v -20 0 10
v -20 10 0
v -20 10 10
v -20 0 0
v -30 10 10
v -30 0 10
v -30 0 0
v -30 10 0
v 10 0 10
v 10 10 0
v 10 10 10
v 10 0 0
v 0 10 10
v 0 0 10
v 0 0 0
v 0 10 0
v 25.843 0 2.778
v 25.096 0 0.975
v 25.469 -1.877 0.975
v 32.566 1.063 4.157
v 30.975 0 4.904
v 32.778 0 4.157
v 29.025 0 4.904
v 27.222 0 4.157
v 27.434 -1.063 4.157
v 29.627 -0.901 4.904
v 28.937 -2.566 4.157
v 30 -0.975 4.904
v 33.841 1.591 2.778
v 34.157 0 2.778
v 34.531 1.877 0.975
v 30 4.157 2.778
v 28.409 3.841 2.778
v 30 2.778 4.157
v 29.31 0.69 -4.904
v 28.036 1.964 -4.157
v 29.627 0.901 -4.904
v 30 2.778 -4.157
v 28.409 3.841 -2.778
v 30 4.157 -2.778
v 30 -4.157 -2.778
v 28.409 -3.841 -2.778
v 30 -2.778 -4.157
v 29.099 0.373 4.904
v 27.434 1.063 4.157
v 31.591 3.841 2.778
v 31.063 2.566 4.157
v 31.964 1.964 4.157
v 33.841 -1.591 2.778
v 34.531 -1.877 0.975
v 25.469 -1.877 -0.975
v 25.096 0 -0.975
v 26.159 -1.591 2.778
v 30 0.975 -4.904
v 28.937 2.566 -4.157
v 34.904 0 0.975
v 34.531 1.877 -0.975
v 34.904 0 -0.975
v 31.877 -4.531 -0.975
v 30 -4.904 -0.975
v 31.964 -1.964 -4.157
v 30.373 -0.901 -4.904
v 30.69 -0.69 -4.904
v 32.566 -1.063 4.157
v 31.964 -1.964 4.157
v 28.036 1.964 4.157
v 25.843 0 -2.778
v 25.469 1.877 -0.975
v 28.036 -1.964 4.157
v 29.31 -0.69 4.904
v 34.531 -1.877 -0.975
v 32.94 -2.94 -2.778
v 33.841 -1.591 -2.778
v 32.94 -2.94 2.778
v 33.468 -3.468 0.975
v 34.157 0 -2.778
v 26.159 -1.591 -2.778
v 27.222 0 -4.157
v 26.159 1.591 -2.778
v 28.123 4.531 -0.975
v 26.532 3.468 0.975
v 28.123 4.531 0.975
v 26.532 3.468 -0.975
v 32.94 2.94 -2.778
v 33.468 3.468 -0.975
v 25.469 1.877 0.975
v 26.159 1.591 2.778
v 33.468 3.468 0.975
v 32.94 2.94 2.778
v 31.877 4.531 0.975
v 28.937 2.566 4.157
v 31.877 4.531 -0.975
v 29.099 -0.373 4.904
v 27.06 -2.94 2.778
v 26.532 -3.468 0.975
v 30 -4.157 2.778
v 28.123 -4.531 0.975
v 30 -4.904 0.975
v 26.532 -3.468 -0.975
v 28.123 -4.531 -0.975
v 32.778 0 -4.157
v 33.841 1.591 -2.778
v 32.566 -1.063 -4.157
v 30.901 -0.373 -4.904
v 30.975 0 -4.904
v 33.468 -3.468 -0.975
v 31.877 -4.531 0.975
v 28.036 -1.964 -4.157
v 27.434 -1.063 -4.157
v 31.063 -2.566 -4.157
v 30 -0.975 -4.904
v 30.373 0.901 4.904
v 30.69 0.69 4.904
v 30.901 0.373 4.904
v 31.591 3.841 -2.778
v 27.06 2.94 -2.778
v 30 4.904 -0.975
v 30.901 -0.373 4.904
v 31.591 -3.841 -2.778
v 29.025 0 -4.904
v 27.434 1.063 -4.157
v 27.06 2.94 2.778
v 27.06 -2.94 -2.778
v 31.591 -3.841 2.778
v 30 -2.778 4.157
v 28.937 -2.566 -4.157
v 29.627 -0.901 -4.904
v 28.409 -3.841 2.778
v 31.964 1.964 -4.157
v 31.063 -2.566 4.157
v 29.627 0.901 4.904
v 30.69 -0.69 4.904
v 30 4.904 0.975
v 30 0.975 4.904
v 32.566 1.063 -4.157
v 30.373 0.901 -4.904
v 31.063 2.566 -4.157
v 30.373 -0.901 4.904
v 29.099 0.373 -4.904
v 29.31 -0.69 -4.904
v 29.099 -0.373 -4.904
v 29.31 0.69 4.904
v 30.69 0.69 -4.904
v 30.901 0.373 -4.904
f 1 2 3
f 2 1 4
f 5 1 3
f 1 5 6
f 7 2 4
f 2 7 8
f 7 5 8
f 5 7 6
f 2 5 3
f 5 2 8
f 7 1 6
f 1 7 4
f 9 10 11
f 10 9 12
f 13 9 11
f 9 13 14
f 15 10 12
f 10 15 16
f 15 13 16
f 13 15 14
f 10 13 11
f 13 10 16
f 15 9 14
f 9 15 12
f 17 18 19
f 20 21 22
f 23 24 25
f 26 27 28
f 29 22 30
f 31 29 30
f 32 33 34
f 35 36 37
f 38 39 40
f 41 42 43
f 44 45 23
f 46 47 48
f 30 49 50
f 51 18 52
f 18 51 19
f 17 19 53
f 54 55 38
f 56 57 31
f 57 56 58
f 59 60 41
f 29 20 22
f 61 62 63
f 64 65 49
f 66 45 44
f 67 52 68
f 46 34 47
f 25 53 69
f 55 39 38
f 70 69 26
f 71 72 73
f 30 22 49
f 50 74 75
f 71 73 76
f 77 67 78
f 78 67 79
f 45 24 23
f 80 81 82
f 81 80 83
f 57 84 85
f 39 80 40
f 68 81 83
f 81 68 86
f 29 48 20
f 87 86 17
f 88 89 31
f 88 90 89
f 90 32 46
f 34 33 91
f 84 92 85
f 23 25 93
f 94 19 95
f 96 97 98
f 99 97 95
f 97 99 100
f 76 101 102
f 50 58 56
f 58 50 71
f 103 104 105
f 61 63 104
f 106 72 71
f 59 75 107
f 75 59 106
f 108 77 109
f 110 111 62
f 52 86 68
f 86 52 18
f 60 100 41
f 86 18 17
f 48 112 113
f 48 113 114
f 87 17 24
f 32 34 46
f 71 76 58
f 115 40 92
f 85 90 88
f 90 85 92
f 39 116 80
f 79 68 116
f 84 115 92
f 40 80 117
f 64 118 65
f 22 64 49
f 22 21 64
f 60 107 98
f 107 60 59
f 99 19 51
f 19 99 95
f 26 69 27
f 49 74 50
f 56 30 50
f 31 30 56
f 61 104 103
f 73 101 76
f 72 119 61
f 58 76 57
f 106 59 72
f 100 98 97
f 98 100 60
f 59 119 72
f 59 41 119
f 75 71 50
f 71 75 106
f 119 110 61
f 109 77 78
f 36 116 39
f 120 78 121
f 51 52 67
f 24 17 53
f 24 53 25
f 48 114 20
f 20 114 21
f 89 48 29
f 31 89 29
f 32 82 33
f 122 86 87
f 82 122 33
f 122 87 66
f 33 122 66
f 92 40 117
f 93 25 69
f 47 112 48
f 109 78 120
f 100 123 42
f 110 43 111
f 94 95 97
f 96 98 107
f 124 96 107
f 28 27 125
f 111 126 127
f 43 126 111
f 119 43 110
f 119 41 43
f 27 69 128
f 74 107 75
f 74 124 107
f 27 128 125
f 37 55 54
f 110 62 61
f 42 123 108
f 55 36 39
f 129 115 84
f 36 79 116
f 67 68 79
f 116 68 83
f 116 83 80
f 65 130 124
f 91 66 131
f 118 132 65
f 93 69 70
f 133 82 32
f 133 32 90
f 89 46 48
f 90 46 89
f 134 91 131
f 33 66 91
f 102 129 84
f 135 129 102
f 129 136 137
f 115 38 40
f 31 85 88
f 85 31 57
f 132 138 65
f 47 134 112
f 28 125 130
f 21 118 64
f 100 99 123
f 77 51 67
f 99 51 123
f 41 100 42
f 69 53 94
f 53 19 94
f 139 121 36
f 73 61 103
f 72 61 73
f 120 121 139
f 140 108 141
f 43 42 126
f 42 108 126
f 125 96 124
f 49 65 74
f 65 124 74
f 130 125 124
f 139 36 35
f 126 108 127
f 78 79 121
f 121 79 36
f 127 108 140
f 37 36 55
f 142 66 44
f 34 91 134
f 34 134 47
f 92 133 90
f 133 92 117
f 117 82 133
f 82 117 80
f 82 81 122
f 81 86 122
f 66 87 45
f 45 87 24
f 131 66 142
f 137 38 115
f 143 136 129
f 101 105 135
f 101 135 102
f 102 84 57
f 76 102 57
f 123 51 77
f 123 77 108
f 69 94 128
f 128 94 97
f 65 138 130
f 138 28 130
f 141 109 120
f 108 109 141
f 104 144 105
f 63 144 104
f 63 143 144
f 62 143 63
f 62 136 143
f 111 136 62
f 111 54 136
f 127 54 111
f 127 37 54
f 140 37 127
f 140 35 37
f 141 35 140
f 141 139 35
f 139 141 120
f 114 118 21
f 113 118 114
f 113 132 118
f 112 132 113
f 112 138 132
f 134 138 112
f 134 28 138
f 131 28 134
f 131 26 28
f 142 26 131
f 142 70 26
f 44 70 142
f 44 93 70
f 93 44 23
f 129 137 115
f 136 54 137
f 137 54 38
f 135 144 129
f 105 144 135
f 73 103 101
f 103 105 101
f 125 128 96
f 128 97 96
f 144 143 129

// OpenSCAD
// file: ../../lib/utilities/color_utils.scad
// lib/utilities/color_utils.scad

/**
 * Applies a color to an object with optional transparency.
 *
 * @param color Color to apply.
 * @param alpha Transparency (0-1).
 */
module applyColor(color, alpha = 1) {
    color([color[0], color[1], color[2], alpha])
    children();
}

/**
 * Lightens a given color.
 *
 * @param color Color to lighten.
 * @param amount Amount to lighten (0-1).
 * @return Lightened color.
 */
function lighten(color, amount) =
    [color[0] + (1 - color[0]) * amount, color[1] + (1 - color[1]) * amount, color[2] + (1 - color[2]) * amount];

/**
 * Darkens a given color.
 *
 * @param color Color to darken.
 * @param amount Amount to darken (0-1).
 * @return Darkened color.
 */
function darken(color, amount) =
    [color[0] * (1 - amount), color[1] * (1 - amount), color[2] * (1 - amount)];
// main file
// tests/utilities/test_color_utils.scad

use <../../lib/utilities/color_utils.scad>

module testColorUtils() {
    // Test Lighten
    color(lighten([1, 0, 0], 0.5))
    translate([-30, 0, 0])
    cube([10, 10, 10]);

    // Test Darken
    color(darken([1, 0, 0], 0.5))
    translate([0, 0, 0])
    cube([10, 10, 10]);
    
    // Test Apply Color with Transparency
    applyColor([0, 1, 0], 0.5)
    translate([30, 0, 0])
    sphere(5);
}

testColorUtils();
